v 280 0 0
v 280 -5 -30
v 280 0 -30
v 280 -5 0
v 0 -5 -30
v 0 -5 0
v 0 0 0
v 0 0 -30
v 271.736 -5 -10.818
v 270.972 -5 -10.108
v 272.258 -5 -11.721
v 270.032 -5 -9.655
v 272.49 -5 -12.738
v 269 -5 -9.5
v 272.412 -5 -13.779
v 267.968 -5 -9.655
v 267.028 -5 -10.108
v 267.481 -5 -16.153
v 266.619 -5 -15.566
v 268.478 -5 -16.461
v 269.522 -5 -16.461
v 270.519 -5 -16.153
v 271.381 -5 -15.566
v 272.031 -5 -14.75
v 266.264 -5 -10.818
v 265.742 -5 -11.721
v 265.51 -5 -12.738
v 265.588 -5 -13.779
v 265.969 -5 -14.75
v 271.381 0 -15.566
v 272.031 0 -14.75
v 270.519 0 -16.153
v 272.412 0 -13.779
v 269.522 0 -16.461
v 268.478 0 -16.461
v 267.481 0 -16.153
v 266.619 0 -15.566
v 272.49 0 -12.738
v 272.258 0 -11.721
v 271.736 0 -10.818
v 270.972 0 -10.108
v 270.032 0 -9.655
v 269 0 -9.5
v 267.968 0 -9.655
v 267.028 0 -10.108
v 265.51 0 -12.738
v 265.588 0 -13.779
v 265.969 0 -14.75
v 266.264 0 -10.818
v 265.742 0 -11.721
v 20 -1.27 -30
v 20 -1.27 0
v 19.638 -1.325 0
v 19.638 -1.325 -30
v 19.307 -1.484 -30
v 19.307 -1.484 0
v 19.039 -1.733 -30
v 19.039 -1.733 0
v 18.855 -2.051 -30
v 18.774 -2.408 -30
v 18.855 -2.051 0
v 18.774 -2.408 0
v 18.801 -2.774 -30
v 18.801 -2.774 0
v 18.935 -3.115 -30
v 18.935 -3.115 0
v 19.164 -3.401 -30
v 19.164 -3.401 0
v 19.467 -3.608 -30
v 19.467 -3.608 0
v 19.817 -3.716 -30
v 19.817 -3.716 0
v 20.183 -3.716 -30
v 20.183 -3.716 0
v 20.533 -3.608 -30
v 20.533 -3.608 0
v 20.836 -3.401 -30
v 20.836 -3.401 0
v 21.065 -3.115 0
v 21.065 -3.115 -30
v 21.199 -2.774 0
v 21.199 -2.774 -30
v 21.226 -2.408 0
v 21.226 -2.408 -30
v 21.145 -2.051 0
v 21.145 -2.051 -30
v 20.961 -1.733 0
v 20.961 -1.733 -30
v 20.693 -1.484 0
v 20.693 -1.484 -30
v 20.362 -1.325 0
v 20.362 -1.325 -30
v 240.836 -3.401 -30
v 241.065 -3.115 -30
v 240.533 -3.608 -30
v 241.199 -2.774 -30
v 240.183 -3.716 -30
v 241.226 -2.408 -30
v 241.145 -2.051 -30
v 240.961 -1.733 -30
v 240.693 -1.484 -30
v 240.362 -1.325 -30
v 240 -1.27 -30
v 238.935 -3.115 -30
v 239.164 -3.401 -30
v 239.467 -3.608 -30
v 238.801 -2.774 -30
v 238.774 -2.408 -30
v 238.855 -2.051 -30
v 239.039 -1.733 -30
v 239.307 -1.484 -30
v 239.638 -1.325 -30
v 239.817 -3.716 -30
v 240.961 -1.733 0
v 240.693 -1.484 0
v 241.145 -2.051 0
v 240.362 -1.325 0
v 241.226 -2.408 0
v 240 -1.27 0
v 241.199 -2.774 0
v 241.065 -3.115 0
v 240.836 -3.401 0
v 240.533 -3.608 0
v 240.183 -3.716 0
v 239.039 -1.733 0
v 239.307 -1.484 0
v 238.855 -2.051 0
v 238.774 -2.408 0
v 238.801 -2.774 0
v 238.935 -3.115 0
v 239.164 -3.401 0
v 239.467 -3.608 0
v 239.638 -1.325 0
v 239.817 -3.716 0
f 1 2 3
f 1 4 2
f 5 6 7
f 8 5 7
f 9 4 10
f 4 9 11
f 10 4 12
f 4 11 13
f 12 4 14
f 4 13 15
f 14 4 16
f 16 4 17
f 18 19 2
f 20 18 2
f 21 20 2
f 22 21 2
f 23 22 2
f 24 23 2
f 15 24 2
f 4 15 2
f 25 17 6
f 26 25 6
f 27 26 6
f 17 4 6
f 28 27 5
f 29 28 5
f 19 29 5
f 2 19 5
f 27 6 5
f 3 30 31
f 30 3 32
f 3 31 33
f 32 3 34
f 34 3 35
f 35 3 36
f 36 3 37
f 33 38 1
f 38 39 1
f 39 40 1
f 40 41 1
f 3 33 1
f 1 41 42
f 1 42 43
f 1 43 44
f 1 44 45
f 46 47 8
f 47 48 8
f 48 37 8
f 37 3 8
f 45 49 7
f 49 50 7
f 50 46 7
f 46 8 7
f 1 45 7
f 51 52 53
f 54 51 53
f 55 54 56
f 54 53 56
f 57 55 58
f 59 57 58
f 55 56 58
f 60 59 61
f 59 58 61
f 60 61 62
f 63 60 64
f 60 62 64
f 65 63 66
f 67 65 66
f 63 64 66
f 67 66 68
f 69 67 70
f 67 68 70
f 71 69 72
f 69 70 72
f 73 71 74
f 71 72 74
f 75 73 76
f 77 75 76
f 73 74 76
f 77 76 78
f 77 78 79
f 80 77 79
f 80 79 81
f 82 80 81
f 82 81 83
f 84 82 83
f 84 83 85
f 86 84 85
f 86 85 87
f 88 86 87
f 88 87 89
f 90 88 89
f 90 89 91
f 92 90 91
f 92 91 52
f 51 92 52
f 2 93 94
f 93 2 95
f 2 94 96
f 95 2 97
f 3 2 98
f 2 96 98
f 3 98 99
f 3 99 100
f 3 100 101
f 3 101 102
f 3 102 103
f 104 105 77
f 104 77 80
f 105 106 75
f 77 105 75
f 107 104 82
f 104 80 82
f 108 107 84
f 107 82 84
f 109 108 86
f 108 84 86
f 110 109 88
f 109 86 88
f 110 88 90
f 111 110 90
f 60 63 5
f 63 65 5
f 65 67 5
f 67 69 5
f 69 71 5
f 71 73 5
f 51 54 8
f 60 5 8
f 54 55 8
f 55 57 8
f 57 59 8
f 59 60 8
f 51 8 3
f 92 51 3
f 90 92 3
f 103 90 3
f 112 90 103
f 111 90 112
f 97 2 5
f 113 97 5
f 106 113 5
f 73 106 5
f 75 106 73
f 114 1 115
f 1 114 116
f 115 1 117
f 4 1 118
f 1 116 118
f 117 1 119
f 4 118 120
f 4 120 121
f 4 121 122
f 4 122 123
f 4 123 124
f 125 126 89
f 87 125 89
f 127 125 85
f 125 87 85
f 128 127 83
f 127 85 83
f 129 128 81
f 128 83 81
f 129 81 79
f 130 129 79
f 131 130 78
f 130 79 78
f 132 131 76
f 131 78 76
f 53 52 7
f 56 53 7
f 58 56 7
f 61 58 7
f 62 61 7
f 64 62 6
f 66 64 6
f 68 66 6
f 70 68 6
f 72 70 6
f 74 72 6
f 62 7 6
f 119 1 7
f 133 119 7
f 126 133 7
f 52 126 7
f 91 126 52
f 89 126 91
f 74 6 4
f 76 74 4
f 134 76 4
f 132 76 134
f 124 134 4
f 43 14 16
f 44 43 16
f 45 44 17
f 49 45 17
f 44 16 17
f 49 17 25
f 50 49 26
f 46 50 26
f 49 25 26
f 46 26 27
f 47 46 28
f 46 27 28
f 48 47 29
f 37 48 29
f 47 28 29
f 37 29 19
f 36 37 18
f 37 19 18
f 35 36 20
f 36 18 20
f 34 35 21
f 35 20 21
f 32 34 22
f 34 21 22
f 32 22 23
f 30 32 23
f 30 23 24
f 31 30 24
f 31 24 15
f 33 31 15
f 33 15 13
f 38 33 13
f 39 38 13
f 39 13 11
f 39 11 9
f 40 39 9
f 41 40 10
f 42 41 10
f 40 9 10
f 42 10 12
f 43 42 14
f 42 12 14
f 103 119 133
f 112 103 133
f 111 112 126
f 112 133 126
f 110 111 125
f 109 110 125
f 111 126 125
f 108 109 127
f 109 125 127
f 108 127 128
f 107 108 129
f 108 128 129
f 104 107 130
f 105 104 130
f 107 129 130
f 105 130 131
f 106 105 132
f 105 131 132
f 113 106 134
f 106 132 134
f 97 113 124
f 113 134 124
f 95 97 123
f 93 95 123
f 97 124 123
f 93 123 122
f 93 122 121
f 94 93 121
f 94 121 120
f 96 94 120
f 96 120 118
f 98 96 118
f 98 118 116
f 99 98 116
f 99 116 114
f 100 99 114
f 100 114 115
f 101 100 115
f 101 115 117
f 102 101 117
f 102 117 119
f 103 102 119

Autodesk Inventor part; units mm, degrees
ref_plane "YZ Plane" through (0, 0, 0) normal (1, 0, 0) x (0, 1, 0)
ref_plane "XZ Plane" through (0, 0, 0) normal (0, 1, 0) x (-1, 0, 0)
ref_plane "XY Plane" through (0, 0, 0) normal (0, 0, 1) x (1, 0, 0)
sketch "スケッチ1" plane through (0, 0, 0) normal (1, 0, 0) x (0, 1, 0)
  line L0 (0, 0) -> (-5, 0)
  line L1 (-5, 0) -> (-5, -30)
  line L2 (-5, -30) -> (0, -30)
  line L3 (0, -30) -> (0, 0)
  dimension "d0" = 30
  dimension "d1" = 5
extrude "押し出し1" add sketch "スケッチ1" along normal blind 280
sketch "スケッチ4" plane through (280, 0, -30) normal (0, 0, -1) x (-1, 0, 0)
  line L0 (280, 0) -> (0, 0) projected
  line L1 (280, -5) -> (280, 0) projected
  point P0 (260, -2.5)
  point P1 (40, -2.5)
  dimension "d27" = 2.5
  dimension "d28" = 20
  dimension "d36" = 220
hole "穴3" at (20, -2.5, -30) at (240, -2.5, -30) direction (0, 0, 1) diameter 2.459 end through all thread size "M3x0.5" class "6H" standard "ANSI Metric M Profile"
sketch "スケッチ6" plane through (0, 0, 0) normal (0, 1, 0) x (1, 0, 0)
  line L0 (280, 30) -> (280, 0) projected
  line L1 (0, 0) -> (280, 0) projected
  point P0 (269, 13)
  dimension "d49" = 11
  dimension "d50" = 13
hole "穴5" at (269, 0, -13) direction (0, -1, 0) diameter 7 end through all
properties part number "横長2ndフラットバー" material "アルミニウム 6061"
